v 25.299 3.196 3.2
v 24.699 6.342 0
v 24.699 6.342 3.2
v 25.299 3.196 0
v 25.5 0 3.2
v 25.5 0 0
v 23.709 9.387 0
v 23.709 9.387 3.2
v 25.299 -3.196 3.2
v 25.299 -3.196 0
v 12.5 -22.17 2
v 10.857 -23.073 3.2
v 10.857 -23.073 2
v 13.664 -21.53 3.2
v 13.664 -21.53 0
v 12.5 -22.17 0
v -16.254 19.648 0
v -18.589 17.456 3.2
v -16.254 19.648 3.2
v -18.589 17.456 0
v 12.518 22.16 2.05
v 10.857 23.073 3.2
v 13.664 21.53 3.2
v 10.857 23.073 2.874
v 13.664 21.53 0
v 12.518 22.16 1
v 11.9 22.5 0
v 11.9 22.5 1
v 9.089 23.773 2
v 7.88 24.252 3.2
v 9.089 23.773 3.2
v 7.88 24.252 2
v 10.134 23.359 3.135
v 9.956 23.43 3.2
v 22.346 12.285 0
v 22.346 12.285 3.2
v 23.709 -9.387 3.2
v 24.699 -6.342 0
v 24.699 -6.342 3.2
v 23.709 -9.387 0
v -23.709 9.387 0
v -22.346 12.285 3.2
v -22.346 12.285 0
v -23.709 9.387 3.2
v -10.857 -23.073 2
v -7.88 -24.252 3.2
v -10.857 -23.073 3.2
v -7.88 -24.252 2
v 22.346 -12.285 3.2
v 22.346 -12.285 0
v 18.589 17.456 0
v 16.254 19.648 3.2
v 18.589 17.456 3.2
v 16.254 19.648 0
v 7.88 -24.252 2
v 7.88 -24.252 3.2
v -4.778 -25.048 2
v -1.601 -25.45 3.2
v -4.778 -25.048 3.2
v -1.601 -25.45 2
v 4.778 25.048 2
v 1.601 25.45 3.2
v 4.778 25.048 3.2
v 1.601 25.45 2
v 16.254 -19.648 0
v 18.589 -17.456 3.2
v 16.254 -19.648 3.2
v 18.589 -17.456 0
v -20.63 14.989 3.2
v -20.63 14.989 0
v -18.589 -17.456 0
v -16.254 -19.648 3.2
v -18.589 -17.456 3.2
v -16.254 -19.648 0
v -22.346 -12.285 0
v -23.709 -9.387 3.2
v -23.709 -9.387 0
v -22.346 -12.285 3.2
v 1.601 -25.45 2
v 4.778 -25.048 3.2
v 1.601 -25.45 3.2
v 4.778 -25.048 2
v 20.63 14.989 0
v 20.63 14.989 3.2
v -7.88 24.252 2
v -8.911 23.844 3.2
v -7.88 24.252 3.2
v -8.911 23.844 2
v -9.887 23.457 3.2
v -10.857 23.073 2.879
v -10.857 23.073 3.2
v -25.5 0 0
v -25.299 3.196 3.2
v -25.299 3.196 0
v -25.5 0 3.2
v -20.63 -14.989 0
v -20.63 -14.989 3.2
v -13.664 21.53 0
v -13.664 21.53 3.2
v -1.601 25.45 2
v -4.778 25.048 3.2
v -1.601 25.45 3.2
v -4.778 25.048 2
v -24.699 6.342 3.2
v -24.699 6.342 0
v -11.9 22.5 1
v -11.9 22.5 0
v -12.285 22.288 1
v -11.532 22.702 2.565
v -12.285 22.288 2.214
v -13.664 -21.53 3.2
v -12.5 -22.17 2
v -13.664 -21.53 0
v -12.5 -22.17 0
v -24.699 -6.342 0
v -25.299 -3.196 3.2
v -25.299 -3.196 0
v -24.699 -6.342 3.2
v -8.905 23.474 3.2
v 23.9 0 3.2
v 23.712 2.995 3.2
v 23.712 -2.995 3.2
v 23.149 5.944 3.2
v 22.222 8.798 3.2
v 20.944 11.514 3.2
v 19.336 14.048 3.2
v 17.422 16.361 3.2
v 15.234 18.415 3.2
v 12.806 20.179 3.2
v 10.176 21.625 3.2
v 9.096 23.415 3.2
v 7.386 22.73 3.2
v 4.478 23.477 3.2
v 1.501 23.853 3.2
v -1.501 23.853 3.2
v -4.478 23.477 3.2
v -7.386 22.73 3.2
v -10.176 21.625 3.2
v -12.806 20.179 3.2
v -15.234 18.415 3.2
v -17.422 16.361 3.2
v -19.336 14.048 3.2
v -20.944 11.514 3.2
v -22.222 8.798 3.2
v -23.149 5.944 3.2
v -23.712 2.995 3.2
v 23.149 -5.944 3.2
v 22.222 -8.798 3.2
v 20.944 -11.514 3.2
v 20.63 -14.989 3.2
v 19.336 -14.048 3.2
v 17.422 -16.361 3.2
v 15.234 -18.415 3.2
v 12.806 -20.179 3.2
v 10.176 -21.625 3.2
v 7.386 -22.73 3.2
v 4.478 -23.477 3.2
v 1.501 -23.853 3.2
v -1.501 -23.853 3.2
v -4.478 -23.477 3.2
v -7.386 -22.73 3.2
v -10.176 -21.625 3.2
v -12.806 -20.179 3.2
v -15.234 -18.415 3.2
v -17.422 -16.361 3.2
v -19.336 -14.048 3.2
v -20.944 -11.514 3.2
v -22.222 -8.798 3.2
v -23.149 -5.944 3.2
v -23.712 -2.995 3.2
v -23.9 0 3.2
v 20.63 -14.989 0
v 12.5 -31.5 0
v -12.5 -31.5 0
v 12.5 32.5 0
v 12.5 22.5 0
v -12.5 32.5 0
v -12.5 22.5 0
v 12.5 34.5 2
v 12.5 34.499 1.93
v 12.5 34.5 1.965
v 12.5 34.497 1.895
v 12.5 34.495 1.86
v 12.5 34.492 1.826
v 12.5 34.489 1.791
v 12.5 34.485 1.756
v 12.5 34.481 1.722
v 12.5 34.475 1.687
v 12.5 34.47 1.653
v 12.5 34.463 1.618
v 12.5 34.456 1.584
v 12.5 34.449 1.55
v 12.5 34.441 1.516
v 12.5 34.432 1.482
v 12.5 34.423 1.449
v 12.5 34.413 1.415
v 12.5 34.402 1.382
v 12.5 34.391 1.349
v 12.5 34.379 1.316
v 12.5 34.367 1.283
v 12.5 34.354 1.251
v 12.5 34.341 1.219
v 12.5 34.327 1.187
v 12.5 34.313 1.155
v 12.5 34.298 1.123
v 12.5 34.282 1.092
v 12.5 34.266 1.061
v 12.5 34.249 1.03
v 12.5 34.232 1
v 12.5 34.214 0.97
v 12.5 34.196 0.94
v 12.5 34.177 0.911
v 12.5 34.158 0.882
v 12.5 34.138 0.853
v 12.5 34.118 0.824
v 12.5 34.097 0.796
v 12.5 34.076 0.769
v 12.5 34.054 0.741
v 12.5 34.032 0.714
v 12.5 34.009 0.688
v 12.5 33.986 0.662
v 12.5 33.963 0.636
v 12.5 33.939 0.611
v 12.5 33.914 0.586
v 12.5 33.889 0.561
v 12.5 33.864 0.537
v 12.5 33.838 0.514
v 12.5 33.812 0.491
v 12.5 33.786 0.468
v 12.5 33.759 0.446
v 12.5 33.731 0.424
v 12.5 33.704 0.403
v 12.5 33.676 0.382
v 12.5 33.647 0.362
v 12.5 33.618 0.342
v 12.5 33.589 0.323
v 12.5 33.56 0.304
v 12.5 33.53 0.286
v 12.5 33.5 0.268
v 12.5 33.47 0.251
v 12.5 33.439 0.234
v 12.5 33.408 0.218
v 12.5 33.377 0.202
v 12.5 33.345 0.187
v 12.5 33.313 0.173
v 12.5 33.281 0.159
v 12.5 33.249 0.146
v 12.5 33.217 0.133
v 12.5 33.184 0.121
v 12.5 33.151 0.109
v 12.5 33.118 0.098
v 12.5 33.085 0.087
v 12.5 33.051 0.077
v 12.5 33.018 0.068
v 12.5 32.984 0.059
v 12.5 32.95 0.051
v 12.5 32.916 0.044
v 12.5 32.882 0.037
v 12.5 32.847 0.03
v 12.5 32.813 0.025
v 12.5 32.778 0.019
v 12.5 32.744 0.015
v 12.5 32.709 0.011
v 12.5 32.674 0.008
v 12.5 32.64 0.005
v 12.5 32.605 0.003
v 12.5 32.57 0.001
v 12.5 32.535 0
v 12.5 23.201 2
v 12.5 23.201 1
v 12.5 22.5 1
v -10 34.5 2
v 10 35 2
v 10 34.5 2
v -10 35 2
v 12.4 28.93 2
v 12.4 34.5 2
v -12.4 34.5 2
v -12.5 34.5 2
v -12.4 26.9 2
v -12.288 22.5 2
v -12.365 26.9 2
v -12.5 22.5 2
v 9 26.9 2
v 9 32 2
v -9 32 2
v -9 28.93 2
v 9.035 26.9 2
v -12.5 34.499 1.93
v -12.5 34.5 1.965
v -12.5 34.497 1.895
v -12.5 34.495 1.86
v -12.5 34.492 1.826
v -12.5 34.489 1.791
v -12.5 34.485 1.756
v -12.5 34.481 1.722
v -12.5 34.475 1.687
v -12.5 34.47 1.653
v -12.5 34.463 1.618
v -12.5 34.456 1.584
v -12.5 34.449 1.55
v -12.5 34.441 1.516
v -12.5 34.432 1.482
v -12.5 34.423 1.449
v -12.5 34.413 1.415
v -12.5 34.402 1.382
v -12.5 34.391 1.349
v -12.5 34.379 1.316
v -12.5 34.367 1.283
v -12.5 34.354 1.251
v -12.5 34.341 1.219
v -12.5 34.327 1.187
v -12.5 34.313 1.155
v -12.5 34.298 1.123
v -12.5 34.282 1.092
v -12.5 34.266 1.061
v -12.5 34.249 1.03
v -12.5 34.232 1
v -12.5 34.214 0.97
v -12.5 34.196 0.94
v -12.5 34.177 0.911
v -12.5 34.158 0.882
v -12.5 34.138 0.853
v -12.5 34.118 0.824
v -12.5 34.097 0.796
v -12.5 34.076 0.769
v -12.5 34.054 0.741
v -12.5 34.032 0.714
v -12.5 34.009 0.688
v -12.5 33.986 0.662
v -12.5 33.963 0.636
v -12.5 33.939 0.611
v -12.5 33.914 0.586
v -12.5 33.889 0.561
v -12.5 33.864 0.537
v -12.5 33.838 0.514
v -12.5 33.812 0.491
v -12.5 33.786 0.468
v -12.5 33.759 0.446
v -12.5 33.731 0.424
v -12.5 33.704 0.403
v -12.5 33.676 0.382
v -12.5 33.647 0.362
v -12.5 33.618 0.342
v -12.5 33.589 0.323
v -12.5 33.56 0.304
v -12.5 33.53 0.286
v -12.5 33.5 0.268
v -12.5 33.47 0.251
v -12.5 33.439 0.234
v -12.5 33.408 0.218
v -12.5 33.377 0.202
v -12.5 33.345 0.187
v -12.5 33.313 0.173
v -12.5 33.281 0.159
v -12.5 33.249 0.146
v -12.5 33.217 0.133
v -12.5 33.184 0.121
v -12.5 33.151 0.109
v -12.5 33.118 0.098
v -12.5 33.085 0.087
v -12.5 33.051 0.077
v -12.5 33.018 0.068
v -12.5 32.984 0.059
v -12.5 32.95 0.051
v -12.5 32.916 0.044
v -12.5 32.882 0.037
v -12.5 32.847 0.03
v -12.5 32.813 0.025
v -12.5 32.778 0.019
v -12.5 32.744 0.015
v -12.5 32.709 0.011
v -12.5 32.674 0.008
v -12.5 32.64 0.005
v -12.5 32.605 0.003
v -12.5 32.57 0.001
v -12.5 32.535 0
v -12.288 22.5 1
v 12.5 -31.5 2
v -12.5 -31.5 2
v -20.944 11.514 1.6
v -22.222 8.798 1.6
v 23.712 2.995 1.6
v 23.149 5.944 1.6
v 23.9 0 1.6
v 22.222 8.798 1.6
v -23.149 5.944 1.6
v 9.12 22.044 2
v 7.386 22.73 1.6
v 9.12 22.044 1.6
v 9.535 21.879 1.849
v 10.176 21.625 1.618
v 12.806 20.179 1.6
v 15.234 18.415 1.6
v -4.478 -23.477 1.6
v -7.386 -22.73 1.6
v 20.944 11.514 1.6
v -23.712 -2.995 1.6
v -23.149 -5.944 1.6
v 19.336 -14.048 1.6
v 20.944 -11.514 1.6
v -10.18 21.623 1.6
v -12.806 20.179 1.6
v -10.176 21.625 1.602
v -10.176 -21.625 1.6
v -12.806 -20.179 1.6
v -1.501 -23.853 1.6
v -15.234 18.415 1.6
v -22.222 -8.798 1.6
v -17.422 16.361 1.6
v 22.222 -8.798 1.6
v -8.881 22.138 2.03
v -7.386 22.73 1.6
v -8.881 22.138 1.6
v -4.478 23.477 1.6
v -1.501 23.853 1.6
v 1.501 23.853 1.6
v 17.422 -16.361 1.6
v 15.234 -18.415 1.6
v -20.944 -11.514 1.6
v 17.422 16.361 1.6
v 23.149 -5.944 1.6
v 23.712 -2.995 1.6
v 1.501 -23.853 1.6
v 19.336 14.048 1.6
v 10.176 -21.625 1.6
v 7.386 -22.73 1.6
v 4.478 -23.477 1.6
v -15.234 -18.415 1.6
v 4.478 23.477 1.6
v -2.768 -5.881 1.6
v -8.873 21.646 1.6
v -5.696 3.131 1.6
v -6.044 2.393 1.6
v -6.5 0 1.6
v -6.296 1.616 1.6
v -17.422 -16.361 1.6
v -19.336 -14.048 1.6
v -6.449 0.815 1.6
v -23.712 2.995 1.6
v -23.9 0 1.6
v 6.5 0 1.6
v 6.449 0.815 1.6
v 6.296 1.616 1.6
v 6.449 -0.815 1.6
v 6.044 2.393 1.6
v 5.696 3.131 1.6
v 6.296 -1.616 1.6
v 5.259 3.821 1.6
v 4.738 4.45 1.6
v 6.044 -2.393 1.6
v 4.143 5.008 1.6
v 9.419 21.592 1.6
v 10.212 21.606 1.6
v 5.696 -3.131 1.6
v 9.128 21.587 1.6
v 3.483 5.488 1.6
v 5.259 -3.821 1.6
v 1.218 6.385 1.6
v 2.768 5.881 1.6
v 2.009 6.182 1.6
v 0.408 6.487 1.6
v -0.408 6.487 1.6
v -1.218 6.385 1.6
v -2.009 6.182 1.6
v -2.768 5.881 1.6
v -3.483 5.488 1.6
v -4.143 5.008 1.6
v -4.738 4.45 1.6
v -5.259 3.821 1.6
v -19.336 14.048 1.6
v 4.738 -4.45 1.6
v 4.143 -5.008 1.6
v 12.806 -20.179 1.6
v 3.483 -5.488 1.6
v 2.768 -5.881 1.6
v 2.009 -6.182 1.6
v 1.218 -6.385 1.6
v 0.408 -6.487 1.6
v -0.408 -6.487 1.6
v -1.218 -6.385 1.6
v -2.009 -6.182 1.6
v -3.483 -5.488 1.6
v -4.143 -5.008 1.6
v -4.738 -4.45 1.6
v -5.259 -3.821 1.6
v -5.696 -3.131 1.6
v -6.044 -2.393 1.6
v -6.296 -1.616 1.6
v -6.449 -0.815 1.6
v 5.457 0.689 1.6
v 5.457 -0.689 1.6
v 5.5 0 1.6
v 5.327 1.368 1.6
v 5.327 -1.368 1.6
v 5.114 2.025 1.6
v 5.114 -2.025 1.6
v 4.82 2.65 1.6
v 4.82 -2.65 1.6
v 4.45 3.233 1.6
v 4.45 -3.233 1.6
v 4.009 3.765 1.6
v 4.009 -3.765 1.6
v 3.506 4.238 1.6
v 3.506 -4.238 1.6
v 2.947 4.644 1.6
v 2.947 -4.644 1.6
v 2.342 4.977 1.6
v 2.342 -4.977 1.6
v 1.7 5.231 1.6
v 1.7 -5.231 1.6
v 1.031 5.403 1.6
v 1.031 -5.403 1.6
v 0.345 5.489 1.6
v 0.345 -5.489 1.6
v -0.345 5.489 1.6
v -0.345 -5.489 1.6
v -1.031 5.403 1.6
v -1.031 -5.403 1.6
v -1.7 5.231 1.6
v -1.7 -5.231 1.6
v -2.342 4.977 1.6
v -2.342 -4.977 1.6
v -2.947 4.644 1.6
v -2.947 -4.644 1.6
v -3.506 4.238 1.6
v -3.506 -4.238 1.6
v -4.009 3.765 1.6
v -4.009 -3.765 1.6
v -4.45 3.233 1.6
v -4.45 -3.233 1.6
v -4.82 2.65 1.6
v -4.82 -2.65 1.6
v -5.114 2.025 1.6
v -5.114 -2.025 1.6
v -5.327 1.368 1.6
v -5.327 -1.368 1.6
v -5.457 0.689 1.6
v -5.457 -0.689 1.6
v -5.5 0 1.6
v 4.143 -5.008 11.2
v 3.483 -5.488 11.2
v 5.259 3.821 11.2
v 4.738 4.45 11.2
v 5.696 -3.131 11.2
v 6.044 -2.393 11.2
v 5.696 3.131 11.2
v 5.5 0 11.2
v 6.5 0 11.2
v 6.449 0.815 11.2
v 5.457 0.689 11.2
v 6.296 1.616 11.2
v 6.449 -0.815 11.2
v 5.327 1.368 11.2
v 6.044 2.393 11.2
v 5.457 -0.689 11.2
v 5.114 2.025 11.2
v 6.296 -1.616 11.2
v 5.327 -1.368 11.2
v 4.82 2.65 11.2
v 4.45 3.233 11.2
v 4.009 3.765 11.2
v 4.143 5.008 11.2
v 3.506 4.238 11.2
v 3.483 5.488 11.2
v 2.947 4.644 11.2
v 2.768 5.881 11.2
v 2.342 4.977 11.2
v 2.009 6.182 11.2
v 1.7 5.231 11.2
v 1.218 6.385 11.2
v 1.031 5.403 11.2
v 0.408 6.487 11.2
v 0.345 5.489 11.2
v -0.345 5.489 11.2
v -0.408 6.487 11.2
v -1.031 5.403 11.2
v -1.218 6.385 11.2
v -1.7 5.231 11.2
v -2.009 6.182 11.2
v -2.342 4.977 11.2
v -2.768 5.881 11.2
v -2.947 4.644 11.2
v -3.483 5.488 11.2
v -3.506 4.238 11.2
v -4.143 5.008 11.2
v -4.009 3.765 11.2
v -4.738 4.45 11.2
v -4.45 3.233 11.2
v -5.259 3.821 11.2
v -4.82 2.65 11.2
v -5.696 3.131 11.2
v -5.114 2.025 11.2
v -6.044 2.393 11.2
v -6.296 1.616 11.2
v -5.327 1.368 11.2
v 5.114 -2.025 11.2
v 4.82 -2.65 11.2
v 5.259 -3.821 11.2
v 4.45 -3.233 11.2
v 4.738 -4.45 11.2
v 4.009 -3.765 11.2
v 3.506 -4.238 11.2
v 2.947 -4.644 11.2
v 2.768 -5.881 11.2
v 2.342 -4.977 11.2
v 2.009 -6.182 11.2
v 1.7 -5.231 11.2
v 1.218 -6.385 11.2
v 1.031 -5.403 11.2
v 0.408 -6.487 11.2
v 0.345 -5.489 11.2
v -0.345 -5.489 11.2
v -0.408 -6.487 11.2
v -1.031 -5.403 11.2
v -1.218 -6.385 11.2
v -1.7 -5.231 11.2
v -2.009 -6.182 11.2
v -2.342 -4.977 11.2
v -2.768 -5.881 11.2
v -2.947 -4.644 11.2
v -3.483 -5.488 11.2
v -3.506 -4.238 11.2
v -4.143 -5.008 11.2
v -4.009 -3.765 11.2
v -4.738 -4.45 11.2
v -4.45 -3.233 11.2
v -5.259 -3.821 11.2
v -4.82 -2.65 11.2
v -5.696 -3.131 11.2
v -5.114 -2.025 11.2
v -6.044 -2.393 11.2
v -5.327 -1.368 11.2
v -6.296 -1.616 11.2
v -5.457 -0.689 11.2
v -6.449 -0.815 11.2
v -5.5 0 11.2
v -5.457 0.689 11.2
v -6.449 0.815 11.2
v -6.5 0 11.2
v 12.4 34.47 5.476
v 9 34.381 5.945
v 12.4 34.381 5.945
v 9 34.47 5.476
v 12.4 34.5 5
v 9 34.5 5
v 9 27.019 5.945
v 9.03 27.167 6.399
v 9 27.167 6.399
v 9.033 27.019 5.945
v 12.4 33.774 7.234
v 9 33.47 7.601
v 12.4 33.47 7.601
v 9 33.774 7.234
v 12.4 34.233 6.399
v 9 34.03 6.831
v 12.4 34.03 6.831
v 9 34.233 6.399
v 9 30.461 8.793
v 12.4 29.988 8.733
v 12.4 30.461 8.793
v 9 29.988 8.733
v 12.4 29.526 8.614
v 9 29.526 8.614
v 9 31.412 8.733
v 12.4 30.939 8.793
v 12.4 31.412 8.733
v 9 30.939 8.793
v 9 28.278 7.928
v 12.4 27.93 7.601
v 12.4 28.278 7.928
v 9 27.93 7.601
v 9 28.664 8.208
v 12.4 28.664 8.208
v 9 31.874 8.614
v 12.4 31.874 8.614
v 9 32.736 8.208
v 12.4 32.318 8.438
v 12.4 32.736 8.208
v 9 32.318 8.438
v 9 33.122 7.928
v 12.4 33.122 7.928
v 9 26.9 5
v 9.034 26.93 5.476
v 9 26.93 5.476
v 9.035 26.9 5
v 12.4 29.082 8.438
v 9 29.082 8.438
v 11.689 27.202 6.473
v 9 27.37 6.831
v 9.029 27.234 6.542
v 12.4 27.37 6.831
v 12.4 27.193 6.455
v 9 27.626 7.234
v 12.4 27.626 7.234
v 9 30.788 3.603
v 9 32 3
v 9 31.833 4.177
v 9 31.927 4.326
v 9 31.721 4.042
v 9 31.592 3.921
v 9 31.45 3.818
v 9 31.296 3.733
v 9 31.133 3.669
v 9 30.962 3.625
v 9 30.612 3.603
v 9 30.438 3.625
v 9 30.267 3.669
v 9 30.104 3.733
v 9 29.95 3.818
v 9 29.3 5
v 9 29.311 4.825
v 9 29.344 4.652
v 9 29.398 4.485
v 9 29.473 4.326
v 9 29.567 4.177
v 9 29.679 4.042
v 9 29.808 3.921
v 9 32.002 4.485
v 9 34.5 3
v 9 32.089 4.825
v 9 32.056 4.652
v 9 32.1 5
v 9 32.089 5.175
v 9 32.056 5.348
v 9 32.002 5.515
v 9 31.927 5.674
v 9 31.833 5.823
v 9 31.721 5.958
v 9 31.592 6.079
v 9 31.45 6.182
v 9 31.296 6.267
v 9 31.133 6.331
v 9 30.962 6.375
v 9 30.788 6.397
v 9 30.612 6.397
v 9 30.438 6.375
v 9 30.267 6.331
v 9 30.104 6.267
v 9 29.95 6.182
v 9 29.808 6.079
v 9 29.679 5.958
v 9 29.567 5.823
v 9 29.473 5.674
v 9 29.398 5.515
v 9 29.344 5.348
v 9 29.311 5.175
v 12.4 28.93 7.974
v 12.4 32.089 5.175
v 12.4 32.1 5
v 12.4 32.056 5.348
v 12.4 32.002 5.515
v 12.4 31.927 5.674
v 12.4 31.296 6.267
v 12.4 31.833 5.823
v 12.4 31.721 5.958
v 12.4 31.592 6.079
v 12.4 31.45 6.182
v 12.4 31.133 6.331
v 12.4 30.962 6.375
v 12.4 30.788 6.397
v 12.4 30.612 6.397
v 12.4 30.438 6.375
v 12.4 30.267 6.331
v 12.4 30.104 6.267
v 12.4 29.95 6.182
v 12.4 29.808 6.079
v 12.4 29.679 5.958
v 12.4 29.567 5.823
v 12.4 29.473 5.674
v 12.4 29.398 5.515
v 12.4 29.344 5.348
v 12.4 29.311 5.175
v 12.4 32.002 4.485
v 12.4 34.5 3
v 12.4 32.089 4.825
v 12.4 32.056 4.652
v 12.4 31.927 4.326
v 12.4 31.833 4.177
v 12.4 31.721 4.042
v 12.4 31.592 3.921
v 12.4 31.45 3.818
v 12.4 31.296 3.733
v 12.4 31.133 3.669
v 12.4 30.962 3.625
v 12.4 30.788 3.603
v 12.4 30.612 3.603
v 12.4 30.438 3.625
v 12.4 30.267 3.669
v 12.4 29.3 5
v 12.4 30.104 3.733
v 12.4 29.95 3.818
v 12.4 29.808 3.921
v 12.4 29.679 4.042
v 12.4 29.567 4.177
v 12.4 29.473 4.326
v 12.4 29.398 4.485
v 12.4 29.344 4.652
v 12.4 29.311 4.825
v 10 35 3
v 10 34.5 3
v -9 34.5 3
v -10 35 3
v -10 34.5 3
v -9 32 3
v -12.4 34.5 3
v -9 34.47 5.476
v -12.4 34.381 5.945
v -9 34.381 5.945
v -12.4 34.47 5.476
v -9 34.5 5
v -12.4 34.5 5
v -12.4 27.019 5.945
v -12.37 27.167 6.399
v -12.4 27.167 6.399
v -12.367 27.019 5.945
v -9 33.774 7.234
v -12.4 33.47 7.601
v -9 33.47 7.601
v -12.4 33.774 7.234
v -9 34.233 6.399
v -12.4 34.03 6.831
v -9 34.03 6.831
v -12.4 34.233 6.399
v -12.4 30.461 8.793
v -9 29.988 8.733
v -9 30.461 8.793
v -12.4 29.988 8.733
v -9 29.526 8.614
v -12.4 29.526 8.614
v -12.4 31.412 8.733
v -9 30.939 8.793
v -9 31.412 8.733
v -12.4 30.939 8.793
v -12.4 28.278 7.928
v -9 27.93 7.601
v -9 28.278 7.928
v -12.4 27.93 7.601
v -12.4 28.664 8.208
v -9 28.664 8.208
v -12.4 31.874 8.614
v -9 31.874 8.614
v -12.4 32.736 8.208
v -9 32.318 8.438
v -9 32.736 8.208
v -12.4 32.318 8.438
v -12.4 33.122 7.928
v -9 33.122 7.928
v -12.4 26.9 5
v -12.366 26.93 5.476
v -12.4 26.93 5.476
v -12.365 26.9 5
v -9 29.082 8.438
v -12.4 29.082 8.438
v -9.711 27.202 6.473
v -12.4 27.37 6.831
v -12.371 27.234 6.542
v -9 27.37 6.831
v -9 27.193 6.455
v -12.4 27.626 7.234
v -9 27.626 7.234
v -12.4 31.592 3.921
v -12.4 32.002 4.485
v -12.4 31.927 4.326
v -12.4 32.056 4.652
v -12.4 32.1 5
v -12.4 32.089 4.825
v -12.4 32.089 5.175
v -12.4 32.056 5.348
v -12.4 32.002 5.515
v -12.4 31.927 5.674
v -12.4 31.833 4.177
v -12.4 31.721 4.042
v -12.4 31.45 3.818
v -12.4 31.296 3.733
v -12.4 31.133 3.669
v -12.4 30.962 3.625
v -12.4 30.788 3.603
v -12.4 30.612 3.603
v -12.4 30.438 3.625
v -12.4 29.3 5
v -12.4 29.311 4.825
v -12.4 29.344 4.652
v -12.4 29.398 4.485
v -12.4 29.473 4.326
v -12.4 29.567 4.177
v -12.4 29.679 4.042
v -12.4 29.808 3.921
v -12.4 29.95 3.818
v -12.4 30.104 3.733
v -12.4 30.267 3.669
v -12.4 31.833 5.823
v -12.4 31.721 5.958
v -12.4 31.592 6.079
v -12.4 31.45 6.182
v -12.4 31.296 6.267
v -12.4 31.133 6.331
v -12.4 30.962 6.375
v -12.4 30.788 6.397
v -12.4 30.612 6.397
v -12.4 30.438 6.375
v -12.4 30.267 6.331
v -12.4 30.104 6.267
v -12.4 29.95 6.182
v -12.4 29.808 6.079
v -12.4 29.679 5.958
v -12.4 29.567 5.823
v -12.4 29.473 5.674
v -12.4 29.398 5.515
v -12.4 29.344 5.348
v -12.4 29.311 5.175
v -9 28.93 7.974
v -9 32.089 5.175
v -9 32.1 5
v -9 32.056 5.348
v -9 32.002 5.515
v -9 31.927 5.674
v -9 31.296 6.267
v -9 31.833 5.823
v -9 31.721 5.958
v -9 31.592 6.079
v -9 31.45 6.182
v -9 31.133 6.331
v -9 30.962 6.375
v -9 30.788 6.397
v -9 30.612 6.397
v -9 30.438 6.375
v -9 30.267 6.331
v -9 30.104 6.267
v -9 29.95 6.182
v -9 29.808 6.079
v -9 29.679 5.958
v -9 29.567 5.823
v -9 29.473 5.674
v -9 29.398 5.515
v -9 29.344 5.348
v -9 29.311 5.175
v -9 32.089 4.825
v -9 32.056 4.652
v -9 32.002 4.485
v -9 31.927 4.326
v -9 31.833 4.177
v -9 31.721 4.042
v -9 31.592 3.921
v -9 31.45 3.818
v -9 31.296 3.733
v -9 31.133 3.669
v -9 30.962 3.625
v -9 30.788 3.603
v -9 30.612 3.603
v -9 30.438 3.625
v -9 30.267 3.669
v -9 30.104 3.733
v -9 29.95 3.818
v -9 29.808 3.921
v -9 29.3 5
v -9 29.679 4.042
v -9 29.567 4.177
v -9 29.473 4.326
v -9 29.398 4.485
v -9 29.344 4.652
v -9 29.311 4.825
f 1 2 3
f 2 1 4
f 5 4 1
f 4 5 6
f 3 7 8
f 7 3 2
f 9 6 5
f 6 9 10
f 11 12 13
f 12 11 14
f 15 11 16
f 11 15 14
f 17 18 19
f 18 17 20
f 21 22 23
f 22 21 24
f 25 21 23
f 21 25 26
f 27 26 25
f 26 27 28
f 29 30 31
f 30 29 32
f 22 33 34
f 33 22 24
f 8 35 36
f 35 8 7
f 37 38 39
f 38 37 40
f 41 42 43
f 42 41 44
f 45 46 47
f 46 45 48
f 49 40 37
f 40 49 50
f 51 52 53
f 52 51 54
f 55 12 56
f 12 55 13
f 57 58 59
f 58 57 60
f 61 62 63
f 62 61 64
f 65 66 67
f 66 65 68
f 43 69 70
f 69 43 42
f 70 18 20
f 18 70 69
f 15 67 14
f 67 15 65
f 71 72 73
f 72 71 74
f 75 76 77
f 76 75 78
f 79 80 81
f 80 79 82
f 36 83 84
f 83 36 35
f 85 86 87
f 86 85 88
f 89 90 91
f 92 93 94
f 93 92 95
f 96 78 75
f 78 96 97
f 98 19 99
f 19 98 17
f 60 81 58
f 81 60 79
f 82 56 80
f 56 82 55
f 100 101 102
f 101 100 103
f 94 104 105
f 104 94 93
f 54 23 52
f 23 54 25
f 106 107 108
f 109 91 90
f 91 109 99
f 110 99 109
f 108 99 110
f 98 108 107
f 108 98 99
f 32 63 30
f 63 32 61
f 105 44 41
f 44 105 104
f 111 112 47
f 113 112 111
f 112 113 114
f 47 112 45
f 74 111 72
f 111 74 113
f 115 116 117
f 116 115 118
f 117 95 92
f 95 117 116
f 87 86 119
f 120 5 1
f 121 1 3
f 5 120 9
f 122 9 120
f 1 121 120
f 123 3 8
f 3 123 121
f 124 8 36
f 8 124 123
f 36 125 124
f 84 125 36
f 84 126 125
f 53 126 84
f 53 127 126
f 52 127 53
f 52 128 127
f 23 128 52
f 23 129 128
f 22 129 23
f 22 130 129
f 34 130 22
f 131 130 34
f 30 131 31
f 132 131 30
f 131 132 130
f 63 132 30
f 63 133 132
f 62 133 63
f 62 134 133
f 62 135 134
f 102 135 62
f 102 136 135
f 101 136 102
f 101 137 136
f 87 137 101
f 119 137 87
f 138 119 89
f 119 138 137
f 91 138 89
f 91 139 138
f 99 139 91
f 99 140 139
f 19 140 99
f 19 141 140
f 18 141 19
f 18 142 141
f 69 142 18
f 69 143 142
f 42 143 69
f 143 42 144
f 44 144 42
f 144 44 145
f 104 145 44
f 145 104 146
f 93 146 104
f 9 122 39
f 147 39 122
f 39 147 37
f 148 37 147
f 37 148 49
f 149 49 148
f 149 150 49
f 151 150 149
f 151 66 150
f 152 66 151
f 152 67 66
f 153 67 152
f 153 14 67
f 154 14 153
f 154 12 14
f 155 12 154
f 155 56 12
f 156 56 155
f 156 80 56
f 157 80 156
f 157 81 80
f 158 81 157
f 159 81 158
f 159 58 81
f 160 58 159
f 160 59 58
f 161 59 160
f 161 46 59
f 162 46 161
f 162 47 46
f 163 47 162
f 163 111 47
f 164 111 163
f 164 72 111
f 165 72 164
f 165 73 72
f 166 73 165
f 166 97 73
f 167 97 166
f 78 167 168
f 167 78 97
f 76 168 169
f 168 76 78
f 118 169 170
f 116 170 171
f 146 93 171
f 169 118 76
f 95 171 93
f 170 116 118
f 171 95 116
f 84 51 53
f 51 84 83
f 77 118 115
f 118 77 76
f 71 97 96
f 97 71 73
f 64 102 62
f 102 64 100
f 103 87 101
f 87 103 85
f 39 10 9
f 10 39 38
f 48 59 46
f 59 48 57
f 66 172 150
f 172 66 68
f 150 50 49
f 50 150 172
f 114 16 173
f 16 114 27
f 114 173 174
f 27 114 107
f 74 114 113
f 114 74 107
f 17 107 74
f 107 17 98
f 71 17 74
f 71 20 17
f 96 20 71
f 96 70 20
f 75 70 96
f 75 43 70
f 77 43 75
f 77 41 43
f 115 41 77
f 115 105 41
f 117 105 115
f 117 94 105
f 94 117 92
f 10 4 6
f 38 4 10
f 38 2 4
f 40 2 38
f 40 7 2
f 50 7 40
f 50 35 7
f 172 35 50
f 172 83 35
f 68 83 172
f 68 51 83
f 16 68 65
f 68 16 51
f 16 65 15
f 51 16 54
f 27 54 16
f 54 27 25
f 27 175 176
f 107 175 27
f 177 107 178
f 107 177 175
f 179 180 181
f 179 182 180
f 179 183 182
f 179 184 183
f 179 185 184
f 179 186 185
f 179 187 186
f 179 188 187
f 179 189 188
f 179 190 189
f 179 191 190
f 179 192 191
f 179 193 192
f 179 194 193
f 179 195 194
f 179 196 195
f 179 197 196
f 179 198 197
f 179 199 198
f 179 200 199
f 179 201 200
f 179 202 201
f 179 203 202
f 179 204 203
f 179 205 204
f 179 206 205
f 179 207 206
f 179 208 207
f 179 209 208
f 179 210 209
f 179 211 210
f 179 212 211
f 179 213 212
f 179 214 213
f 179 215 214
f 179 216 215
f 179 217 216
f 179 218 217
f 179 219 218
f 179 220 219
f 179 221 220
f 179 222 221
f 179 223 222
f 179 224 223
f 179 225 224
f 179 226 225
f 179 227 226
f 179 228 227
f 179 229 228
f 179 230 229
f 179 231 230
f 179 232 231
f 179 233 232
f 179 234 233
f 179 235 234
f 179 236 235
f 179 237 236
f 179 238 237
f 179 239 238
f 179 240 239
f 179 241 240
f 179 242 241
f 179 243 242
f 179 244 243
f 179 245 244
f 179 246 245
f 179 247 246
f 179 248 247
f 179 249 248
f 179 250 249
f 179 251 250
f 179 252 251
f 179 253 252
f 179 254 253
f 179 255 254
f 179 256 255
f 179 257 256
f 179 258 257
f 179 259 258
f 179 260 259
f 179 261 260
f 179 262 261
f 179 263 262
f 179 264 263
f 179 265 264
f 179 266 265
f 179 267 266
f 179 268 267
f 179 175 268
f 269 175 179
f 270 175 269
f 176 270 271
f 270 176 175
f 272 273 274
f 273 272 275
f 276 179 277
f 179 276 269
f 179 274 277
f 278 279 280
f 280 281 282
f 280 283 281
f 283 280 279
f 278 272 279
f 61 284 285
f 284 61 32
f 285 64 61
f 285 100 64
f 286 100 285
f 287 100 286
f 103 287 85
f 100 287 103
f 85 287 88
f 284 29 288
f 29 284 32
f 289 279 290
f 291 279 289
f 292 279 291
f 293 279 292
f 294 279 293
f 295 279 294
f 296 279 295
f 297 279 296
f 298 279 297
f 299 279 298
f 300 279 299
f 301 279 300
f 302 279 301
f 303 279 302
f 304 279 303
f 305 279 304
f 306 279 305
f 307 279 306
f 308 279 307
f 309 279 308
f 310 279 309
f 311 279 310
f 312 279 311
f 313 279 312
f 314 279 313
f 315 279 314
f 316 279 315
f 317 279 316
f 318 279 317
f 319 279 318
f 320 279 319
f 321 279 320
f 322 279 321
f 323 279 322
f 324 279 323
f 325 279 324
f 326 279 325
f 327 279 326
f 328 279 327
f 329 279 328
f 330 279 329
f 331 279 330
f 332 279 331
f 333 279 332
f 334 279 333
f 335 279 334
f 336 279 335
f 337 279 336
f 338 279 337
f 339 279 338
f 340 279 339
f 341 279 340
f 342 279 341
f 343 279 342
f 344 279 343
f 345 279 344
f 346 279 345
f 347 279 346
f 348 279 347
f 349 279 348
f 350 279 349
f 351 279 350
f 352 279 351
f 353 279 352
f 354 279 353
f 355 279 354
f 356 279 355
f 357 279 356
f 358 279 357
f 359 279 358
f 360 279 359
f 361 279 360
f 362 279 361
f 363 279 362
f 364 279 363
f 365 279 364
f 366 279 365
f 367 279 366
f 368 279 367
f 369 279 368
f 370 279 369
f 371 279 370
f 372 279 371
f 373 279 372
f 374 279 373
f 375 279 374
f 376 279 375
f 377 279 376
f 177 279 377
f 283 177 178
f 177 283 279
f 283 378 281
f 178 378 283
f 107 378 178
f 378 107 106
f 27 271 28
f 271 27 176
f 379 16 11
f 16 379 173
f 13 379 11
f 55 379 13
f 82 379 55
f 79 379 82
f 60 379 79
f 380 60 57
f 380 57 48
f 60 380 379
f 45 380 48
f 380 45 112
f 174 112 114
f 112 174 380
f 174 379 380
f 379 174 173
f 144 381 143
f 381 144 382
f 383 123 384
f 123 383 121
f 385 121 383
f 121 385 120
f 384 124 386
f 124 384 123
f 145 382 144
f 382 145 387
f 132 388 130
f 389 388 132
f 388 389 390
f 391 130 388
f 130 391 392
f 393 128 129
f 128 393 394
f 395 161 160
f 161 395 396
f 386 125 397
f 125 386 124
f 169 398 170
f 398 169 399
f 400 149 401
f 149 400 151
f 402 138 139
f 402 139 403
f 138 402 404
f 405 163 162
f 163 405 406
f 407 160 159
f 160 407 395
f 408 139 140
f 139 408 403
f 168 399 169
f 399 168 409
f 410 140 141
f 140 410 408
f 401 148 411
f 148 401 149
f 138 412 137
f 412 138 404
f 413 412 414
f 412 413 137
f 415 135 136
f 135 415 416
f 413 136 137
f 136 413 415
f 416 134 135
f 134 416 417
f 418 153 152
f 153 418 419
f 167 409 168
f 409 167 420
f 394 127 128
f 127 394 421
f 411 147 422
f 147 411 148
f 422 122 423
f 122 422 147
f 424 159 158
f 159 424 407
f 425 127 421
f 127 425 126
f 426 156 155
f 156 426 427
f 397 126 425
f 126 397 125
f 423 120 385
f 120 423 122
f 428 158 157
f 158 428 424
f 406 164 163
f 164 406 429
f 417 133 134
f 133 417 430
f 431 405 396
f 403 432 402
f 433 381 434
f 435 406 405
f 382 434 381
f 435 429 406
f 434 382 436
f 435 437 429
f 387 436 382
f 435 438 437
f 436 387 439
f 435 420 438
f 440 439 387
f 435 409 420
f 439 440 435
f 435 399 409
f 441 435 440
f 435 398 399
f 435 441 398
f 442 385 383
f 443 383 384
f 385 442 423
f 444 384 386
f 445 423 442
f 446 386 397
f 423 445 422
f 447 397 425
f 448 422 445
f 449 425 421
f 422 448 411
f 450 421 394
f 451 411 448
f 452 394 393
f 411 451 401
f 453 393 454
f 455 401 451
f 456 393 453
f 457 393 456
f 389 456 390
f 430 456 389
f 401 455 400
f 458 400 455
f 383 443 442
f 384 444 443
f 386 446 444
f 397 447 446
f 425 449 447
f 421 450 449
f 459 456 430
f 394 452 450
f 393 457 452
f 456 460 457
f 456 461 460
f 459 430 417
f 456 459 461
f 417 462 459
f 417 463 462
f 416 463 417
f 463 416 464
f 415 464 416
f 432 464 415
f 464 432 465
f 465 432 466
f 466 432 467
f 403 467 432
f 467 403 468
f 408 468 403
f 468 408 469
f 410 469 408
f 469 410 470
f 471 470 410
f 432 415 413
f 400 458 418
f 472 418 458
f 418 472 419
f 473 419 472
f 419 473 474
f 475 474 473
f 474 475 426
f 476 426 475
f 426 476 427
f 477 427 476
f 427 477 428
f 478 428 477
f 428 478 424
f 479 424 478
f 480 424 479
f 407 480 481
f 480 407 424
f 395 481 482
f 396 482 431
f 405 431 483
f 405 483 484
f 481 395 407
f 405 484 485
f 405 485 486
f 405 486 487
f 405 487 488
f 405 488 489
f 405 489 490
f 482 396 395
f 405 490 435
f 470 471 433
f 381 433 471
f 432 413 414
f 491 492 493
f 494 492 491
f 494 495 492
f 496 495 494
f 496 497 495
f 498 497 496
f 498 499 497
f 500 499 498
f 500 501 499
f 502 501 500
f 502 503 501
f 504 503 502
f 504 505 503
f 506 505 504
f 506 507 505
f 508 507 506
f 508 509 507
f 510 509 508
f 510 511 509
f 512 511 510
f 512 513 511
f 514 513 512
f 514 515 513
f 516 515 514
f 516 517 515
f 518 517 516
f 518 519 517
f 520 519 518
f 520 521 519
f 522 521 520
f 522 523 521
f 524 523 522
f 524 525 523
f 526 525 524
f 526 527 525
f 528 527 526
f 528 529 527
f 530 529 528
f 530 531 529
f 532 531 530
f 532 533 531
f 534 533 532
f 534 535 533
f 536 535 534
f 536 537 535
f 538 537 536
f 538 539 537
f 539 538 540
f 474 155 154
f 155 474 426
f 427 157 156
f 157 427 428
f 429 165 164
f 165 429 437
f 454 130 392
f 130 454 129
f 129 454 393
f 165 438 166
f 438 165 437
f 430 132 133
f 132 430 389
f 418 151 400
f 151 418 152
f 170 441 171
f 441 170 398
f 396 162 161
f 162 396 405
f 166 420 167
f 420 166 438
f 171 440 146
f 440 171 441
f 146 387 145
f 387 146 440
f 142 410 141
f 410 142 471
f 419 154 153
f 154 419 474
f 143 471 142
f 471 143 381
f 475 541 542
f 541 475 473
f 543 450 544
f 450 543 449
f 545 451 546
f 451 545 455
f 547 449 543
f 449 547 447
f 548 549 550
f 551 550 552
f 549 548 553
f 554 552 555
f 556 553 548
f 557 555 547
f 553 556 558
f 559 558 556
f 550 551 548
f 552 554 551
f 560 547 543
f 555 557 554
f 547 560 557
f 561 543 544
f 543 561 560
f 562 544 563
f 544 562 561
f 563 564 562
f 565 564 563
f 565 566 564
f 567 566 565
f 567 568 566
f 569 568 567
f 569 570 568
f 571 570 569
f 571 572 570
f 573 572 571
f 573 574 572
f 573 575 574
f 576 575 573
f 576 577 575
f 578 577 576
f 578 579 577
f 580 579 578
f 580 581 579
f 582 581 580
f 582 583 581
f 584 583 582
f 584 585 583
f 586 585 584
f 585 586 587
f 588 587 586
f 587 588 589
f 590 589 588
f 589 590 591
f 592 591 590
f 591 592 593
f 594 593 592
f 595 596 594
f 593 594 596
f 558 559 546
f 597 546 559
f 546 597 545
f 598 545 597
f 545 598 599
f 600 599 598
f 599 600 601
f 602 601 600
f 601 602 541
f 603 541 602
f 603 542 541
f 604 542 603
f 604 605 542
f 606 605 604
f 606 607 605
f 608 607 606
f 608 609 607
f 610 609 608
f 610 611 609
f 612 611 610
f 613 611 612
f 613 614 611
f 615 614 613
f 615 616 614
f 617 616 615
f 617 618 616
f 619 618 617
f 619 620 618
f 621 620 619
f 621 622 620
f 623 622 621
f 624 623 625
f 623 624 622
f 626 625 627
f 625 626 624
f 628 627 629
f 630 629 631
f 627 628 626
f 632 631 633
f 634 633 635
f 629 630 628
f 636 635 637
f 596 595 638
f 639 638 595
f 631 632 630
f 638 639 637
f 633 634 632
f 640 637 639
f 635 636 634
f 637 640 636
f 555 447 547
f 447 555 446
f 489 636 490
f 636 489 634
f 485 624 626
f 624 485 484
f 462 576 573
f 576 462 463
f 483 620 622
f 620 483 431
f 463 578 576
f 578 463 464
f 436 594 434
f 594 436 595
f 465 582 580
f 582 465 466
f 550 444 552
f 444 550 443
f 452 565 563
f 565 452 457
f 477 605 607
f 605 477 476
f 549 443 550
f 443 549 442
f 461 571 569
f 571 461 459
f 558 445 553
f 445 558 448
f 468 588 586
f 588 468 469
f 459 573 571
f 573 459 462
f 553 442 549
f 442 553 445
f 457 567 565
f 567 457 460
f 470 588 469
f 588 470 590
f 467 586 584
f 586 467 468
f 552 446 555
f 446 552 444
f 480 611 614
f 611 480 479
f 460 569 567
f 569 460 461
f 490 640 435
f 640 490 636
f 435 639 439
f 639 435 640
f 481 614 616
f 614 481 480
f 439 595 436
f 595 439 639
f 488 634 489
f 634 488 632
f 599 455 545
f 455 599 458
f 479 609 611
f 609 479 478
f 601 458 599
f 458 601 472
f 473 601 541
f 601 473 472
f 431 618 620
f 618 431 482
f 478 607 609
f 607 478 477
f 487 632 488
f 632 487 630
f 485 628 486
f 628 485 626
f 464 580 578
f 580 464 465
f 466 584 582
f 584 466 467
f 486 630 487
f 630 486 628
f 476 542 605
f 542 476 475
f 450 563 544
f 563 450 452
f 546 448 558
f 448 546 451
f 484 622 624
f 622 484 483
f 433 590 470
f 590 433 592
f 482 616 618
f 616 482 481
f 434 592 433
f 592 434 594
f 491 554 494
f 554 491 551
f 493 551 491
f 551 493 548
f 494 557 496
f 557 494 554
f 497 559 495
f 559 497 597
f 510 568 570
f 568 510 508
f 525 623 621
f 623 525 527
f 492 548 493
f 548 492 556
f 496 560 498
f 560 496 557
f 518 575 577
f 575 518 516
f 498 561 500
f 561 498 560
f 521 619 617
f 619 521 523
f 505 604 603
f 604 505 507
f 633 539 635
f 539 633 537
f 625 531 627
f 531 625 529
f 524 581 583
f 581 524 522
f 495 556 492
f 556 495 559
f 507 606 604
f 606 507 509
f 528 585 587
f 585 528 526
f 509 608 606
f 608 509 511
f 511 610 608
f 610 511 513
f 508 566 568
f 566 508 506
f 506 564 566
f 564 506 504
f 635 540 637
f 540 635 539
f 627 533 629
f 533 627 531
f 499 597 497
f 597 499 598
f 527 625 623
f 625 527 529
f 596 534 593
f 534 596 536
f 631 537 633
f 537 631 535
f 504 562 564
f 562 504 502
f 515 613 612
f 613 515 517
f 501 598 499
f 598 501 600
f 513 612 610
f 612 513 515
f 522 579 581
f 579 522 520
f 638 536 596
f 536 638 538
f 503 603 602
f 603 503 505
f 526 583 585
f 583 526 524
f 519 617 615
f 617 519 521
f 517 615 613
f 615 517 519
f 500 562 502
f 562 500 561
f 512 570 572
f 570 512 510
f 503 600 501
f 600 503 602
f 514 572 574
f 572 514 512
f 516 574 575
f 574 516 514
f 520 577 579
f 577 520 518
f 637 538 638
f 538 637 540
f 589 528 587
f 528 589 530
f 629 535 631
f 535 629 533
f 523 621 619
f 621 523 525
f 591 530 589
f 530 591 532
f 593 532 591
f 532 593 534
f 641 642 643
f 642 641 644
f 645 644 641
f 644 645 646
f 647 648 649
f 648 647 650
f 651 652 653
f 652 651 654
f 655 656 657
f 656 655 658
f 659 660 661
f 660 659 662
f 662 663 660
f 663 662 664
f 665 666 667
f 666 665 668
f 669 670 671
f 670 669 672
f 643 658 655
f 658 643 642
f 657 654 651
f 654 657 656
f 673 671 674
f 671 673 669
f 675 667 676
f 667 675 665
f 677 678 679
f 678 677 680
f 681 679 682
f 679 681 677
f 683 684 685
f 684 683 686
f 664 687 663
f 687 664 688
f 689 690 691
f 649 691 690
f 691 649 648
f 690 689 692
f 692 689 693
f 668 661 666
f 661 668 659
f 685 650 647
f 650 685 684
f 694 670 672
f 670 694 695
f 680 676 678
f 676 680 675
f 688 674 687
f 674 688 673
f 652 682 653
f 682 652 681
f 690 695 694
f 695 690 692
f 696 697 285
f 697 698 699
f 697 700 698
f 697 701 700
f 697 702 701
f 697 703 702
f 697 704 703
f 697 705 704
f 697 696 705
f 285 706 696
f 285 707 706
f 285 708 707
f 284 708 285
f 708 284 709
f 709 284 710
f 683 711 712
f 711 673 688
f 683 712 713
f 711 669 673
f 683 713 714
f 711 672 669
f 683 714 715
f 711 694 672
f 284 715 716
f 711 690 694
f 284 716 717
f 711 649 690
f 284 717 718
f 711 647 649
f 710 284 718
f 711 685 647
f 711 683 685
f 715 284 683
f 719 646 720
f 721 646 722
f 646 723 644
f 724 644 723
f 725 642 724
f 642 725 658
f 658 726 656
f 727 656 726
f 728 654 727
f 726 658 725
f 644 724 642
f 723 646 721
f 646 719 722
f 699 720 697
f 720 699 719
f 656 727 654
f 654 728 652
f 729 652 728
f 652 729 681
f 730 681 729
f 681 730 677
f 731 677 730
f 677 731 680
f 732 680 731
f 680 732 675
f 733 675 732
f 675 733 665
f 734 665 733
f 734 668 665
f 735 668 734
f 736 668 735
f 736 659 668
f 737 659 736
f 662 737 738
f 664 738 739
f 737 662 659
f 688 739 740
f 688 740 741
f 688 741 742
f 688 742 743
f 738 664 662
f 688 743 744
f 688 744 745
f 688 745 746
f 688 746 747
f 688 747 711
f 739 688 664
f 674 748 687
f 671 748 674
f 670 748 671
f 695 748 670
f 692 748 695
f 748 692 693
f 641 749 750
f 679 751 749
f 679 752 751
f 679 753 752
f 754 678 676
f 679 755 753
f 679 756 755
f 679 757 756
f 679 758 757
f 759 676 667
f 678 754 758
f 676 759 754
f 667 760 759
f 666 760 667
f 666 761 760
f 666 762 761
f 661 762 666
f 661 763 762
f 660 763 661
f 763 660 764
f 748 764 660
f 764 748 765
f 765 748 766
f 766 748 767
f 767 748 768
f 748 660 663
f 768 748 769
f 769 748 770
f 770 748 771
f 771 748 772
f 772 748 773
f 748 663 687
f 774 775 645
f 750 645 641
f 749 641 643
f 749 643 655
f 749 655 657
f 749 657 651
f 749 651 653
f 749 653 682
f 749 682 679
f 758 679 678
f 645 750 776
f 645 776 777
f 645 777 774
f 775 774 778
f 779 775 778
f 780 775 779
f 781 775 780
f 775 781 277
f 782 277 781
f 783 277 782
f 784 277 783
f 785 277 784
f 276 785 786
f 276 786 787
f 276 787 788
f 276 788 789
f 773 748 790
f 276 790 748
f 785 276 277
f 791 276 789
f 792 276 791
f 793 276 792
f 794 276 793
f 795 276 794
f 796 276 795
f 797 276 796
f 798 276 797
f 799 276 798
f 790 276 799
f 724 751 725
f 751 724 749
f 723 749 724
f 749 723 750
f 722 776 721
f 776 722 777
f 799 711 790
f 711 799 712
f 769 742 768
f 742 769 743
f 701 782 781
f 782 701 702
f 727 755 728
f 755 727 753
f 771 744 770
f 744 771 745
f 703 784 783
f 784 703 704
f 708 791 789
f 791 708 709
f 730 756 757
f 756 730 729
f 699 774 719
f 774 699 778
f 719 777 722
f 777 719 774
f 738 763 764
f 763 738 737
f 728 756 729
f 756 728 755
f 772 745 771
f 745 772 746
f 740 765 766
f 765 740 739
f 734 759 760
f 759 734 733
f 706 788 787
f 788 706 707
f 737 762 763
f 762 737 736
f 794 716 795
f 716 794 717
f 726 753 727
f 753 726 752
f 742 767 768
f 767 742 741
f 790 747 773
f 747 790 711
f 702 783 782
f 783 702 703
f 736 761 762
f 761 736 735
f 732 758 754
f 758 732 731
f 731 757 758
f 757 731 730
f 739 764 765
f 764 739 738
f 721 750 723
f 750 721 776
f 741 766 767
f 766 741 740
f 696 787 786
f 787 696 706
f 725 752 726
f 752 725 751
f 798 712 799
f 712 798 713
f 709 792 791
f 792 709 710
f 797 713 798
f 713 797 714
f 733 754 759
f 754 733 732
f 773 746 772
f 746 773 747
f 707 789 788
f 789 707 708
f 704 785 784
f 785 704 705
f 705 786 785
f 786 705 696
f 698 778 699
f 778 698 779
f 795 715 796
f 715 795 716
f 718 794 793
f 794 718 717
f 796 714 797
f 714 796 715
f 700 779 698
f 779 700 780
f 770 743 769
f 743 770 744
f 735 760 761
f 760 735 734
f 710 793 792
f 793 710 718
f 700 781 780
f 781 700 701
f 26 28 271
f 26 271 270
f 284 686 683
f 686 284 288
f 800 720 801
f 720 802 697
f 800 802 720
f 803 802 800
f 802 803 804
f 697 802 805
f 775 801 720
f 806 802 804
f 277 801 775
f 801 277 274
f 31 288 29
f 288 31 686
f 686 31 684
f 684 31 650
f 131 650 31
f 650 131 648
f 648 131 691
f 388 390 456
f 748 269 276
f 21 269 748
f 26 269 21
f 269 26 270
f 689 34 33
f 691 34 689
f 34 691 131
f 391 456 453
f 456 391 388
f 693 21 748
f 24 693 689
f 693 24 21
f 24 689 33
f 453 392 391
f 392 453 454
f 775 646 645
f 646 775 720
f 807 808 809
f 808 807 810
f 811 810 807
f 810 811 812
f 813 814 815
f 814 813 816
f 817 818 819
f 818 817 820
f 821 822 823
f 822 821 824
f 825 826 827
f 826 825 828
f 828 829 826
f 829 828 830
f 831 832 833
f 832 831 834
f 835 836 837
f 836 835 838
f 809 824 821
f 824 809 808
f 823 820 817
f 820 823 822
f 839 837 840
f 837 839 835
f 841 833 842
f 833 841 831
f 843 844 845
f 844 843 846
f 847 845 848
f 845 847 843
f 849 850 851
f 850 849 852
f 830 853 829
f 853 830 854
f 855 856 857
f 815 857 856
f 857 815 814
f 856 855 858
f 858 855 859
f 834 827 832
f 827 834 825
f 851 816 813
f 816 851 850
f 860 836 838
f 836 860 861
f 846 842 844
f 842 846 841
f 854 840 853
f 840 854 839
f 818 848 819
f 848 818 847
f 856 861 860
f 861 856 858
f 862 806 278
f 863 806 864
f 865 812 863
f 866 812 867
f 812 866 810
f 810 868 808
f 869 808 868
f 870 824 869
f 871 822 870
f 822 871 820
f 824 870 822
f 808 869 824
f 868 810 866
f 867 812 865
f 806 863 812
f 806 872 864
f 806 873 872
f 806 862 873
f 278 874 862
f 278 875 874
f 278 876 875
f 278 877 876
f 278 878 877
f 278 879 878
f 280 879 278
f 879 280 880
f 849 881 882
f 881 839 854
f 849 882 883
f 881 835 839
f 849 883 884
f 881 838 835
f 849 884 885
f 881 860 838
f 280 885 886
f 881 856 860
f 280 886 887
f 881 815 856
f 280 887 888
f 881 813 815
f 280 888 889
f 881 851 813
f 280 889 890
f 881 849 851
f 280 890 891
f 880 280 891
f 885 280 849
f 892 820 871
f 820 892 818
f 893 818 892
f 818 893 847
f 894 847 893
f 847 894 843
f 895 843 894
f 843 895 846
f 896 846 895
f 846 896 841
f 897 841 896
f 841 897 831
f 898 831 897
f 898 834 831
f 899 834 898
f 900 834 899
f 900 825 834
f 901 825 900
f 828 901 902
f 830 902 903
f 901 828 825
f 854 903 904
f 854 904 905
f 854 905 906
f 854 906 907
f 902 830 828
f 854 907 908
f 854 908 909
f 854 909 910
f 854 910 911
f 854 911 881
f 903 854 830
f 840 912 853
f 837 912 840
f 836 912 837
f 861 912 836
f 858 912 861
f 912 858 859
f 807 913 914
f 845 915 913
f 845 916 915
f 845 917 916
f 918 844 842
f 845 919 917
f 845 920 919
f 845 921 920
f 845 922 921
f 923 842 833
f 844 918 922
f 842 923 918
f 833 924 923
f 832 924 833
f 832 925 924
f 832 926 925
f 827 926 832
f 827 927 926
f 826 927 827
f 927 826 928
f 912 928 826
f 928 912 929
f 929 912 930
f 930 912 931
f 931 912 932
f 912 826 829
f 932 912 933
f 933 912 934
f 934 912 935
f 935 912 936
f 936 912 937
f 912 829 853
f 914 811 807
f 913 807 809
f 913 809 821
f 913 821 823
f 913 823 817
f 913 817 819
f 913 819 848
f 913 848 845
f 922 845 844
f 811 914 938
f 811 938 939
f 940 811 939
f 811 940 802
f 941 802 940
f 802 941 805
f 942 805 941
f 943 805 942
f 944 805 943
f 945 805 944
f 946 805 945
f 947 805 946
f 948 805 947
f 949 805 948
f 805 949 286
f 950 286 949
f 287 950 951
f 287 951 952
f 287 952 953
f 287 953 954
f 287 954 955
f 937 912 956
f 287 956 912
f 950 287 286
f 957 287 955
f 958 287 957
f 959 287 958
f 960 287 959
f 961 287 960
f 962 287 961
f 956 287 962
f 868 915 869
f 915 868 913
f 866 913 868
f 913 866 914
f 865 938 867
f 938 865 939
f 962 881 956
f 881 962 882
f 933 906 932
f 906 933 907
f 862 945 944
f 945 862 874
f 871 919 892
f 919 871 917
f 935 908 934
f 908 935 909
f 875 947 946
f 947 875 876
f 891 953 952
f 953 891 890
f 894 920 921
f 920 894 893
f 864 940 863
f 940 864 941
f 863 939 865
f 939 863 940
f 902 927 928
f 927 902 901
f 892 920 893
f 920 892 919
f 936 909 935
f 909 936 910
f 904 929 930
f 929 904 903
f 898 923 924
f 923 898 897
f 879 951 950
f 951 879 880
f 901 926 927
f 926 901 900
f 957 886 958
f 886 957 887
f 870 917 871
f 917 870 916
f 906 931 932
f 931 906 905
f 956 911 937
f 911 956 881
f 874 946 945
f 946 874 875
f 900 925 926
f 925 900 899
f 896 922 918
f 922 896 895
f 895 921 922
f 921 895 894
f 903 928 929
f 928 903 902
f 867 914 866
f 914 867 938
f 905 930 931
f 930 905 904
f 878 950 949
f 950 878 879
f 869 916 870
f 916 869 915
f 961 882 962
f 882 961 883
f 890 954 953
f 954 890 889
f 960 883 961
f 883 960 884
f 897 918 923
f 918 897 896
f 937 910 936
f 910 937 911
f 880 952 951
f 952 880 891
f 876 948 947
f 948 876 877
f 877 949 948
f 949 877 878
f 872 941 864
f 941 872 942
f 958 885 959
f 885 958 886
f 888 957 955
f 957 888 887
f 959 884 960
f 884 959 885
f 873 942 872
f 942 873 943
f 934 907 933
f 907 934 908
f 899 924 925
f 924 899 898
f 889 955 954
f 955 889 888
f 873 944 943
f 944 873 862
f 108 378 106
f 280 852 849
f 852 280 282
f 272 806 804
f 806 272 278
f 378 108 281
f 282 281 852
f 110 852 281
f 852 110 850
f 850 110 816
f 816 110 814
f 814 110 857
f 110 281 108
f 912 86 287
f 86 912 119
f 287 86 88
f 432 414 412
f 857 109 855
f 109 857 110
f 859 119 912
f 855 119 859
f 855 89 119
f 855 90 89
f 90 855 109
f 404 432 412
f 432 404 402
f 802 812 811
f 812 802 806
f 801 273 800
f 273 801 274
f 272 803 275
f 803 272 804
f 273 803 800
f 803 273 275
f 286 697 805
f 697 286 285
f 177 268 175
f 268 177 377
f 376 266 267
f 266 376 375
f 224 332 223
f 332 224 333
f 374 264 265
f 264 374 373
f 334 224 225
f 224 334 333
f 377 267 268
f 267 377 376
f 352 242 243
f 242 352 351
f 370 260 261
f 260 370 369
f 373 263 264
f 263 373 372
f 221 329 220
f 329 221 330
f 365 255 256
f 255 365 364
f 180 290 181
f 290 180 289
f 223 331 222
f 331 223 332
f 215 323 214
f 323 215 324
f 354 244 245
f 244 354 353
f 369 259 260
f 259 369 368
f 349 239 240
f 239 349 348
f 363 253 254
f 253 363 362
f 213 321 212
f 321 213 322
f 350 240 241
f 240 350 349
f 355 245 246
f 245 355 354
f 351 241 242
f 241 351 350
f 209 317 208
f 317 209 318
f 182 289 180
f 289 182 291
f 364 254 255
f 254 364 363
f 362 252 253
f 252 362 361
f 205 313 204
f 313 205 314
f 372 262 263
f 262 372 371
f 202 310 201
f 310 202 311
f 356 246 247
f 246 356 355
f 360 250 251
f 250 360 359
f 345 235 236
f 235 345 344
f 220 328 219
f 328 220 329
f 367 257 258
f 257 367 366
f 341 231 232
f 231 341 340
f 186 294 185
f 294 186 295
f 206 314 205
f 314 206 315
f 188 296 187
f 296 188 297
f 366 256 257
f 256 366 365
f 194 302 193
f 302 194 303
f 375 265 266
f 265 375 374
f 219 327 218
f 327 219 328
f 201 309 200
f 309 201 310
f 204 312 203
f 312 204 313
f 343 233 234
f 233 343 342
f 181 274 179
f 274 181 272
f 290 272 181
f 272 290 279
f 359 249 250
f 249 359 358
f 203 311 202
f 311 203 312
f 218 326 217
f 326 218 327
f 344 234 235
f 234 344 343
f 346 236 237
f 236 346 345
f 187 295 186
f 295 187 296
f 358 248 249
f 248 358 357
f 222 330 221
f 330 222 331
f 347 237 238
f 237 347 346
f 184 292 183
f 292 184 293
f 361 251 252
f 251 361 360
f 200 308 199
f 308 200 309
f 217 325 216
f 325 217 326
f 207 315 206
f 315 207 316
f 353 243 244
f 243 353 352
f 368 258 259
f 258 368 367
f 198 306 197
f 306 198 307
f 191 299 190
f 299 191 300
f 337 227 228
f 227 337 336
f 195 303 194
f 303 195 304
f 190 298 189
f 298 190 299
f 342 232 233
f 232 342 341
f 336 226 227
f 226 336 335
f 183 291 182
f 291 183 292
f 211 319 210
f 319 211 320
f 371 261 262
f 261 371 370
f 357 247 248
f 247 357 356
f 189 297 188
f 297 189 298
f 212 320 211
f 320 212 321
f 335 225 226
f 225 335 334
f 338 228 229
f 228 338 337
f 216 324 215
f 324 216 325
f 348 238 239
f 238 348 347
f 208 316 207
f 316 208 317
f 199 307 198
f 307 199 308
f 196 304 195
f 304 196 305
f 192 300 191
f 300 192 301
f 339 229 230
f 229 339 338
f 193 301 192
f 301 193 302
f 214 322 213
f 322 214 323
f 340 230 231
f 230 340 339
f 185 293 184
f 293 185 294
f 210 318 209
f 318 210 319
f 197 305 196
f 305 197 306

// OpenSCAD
outer_diameter = 51;
outer_height = 3.2;
rim_width = 3.2;
$fn=50;


module support_triangle(side_length, side_height){
  polygon(points=[[0,0],[0,side_length],[side_height,0]], paths=[[0,1,2]]);
}

module hollow_cylinder(d, h, w){
  difference(){
    cylinder(d=d, h=h);
    cylinder(d=d-w*2, h=h);
  }
}

module connector(length=7.6, width=3.4, wire_width=2.4){
  difference(){
    union(){
      rotate([90,0,90]){
        hollow_cylinder(d=length, h=width, w=wire_width);
      }
      translate([0,2,-2])
        cube([width,1.8,2]);
      translate([0,-3.8,-4]){
        cube([width,2,4]);
        translate([0,0,1]){
          cube([width,length,1]);
        }
        translate([0,2,0])
        rotate([180,-90,1])
          linear_extrude(width)
          support_triangle(8,7);
      }
    }

    // this one is straight down - which is problematic with the springs
    /*
    translate([0,length/-2+wire_width+0.5,0])
      cube([width, wire_width-1, 10]);
    */

    // angled cut - better with springs, harder to mount
    /*
    translate([0,length/-2+4,-1])
      rotate([35,0,0])
      cube([width+1, wire_width-1, 5]);
    */

    // angled cut - better with springs, harder to mount
    /*
    translate([0,length/-2+7,-1])
      rotate([90,0,0])
      cube([width+1, wire_width-1, 5]);
    */
  }


}

difference(){
  union(){
    cylinder(d=outer_diameter, h=outer_height);
    translate([-12.5,outer_diameter/2-3,0])
      cube([25,10,2]);
    translate([-12.5,outer_diameter/-2+-6,0])
      cube([25,11,2]);
  }
  translate([0,0,outer_height/2]){
    cylinder(d=outer_diameter-rim_width, h=outer_height/2);
  }
}

hollow_cylinder(d=13, h=8+outer_height, w=1);

translate([9,outer_diameter/2+5.2,5]){
  connector();
}

translate([-12.4,outer_diameter/2+5.2,5]){
  connector();
}

// bar for tensioning the spring
translate([-10,outer_diameter/2+6.5,2]){
  cube([20,3,1]);
}

radius=2;
angles=[0,90];
points = [
    for(a = [angles[0]:1:angles[1]]) [radius * cos(a), radius * sin(a)]
];

translate([-12.5,32.5,2])
rotate([0,90,0])
linear_extrude(25)
polygon(concat([[0, 0]], points));
